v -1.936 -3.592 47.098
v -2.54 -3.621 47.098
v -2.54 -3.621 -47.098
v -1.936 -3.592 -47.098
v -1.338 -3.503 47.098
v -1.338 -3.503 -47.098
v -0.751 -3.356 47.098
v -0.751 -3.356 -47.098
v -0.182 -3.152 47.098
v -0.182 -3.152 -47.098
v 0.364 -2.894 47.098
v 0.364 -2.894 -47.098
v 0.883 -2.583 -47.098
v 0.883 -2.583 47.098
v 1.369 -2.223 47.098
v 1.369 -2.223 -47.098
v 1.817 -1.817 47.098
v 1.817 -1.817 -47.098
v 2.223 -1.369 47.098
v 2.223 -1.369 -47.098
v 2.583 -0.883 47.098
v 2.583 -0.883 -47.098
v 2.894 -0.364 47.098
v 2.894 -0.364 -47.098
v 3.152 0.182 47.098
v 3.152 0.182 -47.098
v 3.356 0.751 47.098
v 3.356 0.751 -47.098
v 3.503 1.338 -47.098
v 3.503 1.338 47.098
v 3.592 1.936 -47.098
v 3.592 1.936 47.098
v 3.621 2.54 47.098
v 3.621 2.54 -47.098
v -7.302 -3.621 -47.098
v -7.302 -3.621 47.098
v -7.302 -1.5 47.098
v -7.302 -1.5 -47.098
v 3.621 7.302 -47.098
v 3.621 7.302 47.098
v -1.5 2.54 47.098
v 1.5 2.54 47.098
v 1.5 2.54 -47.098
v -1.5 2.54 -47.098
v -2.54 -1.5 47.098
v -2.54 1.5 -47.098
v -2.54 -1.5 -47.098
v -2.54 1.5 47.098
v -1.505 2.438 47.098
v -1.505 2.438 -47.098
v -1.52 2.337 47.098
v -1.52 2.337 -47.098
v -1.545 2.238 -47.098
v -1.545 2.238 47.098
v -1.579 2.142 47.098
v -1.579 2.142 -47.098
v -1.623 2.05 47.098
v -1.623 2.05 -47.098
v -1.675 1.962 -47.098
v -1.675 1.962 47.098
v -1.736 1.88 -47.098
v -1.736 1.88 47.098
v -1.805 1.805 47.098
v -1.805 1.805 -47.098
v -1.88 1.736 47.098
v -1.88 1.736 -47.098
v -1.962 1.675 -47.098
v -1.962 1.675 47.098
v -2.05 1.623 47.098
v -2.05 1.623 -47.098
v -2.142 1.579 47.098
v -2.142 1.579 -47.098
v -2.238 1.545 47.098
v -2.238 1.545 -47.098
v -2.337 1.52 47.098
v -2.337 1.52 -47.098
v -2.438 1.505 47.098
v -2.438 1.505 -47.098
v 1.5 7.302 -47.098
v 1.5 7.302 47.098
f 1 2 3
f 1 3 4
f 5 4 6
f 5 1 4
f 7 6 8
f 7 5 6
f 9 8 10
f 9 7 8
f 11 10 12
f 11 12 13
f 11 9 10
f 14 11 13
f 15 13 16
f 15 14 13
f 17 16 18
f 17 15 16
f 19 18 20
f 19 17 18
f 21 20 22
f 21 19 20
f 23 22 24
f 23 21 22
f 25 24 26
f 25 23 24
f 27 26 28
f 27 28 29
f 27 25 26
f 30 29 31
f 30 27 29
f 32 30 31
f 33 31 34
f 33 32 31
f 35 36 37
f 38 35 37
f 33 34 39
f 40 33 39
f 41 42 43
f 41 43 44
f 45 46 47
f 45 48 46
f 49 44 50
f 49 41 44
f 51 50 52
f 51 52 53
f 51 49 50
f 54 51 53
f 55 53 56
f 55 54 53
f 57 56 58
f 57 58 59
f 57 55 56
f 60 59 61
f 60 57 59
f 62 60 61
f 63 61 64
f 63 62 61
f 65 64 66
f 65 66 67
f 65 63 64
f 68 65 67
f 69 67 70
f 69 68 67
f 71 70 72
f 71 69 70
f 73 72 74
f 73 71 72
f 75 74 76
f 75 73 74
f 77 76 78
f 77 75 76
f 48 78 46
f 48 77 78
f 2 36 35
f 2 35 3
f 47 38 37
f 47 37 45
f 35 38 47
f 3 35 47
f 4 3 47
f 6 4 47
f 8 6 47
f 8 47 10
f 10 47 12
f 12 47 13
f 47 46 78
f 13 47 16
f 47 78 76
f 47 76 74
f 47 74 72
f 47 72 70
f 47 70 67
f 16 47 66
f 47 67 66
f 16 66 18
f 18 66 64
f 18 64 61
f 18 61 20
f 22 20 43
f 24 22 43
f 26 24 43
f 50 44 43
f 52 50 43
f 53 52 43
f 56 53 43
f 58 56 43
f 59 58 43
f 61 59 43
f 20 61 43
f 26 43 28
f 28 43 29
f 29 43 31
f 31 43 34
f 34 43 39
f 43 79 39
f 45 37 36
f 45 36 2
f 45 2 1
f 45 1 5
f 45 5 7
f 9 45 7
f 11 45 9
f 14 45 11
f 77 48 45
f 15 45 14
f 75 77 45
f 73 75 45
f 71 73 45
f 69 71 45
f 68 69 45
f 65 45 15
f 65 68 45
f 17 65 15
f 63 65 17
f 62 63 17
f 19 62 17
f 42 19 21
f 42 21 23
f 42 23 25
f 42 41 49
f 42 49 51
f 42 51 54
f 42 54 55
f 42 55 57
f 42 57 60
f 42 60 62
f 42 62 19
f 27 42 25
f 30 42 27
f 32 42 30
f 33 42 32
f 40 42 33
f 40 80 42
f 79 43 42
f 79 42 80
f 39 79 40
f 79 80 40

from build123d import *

# Parameters (mm, degrees)
SKETCH7_W           = 4.7625
SKETCH7_H           = 2.12122512
BOSS_EXTRUDE2_DEPTH = 47.09795
SKETCH8_W           = 2.12122512
SKETCH8_H           = 4.7625
BOSS_EXTRUDE3_DEPTH = 47.09795
BOSS_EXTRUDE4_DEPTH = 47.09795


with BuildPart() as part:
    # Sketch7 → Boss-Extrude2 (new, symmetric)
    with BuildSketch(Plane.XY):
        with Locations((-4.92125, -2.560612608)):
            Rectangle(SKETCH7_W, SKETCH7_H)
    extrude(amount=BOSS_EXTRUDE2_DEPTH, both=True)



with BuildPart() as body_2:
    # Sketch8 → Boss-Extrude3 (new, symmetric)
    with BuildSketch(Plane.XY):
        with Locations((2.560612608, 4.92125)):
            Rectangle(SKETCH8_W, SKETCH8_H)
    extrude(amount=BOSS_EXTRUDE3_DEPTH, both=True)


with BuildPart() as part_1:
    add(part.part)

    add(body_2.part)  # Boss-Extrude4 merges body 2
    # Sketch11 → Boss-Extrude4 (add, symmetric)
    with BuildSketch(Plane.XY):
        with BuildLine():
            Line((-2.54, -1.500000048), (-7.3025, -1.500000048))
            Line((-7.3025, -1.500000048), (-7.3025, -3.621225168))
            Line((-7.3025, -3.621225168), (-2.54, -3.621225168))
            ThreePointArc((-2.54, -3.621225168), (1.816644097, -1.816644097), (3.621225168, 2.54))
            Line((3.621225168, 2.54), (3.621225168, 7.3025))
            Line((3.621225168, 7.3025), (1.500000048, 7.3025))
            Line((1.500000048, 7.3025), (1.500000048, 2.54))
            Line((1.500000048, 2.54), (-1.500000048, 2.54))
            ThreePointArc((-1.500000048, 2.54), (-1.804608982, 1.804608982), (-2.54, 1.500000048))
            Line((-2.54, 1.500000048), (-2.54, -1.500000048))
        make_face()
    extrude(amount=BOSS_EXTRUDE4_DEPTH, both=True)


solid = part_1.part
